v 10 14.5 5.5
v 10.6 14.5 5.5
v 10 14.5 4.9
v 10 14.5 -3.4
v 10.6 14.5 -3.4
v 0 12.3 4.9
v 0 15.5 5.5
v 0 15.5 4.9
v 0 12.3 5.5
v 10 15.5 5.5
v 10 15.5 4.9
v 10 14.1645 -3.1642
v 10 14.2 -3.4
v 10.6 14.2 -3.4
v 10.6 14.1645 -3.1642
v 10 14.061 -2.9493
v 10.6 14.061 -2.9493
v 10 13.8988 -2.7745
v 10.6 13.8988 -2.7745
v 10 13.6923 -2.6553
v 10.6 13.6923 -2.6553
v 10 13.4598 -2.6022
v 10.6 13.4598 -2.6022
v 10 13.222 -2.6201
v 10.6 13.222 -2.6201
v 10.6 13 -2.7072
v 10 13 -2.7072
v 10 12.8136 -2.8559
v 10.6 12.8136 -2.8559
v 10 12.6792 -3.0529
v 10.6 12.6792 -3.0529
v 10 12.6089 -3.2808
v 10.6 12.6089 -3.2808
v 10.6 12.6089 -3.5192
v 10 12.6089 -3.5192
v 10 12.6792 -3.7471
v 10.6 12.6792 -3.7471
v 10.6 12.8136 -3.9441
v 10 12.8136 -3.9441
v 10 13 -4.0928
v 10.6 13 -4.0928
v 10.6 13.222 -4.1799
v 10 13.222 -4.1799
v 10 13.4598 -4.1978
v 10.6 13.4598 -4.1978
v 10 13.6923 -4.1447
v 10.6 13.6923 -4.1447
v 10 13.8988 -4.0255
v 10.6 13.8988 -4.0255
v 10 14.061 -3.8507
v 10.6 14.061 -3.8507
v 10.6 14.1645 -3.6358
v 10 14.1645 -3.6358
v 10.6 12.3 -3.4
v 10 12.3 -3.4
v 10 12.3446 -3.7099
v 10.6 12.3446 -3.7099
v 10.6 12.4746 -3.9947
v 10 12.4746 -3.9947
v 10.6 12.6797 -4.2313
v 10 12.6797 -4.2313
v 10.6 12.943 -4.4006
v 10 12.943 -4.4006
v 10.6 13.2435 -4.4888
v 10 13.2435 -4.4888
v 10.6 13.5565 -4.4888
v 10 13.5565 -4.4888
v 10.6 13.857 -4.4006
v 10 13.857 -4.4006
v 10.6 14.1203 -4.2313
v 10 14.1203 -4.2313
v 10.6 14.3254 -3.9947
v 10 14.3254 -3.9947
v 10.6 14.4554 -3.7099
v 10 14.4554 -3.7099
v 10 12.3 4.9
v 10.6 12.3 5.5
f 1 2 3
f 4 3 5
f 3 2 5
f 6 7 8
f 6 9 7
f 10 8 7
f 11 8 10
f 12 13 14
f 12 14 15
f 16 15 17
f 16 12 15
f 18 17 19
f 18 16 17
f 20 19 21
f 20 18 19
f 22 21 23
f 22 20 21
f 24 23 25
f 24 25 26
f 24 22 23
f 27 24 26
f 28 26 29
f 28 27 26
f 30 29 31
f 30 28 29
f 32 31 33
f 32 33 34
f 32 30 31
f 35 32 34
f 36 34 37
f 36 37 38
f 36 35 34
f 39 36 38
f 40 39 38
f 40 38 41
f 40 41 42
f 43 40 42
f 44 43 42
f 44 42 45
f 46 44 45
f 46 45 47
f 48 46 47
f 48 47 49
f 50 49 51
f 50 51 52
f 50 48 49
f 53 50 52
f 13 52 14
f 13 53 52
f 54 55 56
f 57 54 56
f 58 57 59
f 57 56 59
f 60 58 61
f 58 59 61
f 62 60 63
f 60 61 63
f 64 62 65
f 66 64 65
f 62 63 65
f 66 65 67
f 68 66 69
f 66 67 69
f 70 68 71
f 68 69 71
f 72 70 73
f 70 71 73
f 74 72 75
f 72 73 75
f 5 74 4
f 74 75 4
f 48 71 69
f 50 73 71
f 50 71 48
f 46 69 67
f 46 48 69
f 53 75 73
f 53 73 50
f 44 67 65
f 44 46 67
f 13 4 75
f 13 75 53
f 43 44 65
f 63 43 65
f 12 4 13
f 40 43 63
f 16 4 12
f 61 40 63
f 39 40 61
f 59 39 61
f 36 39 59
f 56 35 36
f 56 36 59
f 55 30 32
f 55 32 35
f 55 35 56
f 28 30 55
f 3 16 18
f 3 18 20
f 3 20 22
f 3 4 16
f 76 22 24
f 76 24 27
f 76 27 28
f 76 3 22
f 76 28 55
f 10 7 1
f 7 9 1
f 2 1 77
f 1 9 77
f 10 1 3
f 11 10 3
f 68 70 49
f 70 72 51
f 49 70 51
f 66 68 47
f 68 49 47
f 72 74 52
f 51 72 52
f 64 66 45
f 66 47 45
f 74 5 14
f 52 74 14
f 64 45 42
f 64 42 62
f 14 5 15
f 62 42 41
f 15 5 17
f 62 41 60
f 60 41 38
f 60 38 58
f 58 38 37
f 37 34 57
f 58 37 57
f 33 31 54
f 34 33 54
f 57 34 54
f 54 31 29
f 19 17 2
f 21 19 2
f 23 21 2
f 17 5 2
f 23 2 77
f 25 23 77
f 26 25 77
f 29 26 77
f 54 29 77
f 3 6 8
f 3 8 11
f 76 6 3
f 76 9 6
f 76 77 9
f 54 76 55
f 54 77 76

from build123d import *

# Parameters (mm, degrees)
SKETCH069_R     = 0.8
PAD044_DEPTH    = 0.6
SKETCH079_W     = 2.2
SKETCH079_H     = 0.6
PAD040_DEPTH    = 10
PAD040_FACE12_W = 10
PAD040_FACE12_H = 0.6
PAD045_DEPTH    = 1


with BuildPart() as part:
    # Sketch069 → Pad044 (new body)
    with BuildSketch(Plane.YZ):
        with BuildLine():
            Line((0, -8.9), (0, 0))
            Line((0, 0), (2.2, 0))
            Line((2.2, 0), (2.2, -8.9))
            ThreePointArc((0, -8.9), (1.1, -10), (2.2, -8.9))
        make_face()
        with Locations((1.1, -8.9)):
            Circle(SKETCH069_R, mode=Mode.SUBTRACT)
    extrude(amount=PAD044_DEPTH)

    # Sketch079 (on Face6 of Pad044) → Pad040 (join)
    with BuildSketch(Plane(origin=(0, 0, 0), x_dir=(0, 1, 0), z_dir=(-1, 0, 0))):
        with Locations((1.1, 0.3)):
            Rectangle(SKETCH079_W, SKETCH079_H)
    extrude(amount=PAD040_DEPTH)

    # Pad040 Face12 → Pad045 (add)
    with BuildSketch(Plane(origin=(-5, 2.2, -0.3), x_dir=(1, 0, 0), z_dir=(0, 1, 0))):
        Rectangle(PAD040_FACE12_W, PAD040_FACE12_H)
    extrude(amount=PAD045_DEPTH)


with BuildPart() as part_1:
    # Body011 placement: moved
    add(part.part.moved(Location((10, 12.3, 5.5))))


solid = part_1.part
